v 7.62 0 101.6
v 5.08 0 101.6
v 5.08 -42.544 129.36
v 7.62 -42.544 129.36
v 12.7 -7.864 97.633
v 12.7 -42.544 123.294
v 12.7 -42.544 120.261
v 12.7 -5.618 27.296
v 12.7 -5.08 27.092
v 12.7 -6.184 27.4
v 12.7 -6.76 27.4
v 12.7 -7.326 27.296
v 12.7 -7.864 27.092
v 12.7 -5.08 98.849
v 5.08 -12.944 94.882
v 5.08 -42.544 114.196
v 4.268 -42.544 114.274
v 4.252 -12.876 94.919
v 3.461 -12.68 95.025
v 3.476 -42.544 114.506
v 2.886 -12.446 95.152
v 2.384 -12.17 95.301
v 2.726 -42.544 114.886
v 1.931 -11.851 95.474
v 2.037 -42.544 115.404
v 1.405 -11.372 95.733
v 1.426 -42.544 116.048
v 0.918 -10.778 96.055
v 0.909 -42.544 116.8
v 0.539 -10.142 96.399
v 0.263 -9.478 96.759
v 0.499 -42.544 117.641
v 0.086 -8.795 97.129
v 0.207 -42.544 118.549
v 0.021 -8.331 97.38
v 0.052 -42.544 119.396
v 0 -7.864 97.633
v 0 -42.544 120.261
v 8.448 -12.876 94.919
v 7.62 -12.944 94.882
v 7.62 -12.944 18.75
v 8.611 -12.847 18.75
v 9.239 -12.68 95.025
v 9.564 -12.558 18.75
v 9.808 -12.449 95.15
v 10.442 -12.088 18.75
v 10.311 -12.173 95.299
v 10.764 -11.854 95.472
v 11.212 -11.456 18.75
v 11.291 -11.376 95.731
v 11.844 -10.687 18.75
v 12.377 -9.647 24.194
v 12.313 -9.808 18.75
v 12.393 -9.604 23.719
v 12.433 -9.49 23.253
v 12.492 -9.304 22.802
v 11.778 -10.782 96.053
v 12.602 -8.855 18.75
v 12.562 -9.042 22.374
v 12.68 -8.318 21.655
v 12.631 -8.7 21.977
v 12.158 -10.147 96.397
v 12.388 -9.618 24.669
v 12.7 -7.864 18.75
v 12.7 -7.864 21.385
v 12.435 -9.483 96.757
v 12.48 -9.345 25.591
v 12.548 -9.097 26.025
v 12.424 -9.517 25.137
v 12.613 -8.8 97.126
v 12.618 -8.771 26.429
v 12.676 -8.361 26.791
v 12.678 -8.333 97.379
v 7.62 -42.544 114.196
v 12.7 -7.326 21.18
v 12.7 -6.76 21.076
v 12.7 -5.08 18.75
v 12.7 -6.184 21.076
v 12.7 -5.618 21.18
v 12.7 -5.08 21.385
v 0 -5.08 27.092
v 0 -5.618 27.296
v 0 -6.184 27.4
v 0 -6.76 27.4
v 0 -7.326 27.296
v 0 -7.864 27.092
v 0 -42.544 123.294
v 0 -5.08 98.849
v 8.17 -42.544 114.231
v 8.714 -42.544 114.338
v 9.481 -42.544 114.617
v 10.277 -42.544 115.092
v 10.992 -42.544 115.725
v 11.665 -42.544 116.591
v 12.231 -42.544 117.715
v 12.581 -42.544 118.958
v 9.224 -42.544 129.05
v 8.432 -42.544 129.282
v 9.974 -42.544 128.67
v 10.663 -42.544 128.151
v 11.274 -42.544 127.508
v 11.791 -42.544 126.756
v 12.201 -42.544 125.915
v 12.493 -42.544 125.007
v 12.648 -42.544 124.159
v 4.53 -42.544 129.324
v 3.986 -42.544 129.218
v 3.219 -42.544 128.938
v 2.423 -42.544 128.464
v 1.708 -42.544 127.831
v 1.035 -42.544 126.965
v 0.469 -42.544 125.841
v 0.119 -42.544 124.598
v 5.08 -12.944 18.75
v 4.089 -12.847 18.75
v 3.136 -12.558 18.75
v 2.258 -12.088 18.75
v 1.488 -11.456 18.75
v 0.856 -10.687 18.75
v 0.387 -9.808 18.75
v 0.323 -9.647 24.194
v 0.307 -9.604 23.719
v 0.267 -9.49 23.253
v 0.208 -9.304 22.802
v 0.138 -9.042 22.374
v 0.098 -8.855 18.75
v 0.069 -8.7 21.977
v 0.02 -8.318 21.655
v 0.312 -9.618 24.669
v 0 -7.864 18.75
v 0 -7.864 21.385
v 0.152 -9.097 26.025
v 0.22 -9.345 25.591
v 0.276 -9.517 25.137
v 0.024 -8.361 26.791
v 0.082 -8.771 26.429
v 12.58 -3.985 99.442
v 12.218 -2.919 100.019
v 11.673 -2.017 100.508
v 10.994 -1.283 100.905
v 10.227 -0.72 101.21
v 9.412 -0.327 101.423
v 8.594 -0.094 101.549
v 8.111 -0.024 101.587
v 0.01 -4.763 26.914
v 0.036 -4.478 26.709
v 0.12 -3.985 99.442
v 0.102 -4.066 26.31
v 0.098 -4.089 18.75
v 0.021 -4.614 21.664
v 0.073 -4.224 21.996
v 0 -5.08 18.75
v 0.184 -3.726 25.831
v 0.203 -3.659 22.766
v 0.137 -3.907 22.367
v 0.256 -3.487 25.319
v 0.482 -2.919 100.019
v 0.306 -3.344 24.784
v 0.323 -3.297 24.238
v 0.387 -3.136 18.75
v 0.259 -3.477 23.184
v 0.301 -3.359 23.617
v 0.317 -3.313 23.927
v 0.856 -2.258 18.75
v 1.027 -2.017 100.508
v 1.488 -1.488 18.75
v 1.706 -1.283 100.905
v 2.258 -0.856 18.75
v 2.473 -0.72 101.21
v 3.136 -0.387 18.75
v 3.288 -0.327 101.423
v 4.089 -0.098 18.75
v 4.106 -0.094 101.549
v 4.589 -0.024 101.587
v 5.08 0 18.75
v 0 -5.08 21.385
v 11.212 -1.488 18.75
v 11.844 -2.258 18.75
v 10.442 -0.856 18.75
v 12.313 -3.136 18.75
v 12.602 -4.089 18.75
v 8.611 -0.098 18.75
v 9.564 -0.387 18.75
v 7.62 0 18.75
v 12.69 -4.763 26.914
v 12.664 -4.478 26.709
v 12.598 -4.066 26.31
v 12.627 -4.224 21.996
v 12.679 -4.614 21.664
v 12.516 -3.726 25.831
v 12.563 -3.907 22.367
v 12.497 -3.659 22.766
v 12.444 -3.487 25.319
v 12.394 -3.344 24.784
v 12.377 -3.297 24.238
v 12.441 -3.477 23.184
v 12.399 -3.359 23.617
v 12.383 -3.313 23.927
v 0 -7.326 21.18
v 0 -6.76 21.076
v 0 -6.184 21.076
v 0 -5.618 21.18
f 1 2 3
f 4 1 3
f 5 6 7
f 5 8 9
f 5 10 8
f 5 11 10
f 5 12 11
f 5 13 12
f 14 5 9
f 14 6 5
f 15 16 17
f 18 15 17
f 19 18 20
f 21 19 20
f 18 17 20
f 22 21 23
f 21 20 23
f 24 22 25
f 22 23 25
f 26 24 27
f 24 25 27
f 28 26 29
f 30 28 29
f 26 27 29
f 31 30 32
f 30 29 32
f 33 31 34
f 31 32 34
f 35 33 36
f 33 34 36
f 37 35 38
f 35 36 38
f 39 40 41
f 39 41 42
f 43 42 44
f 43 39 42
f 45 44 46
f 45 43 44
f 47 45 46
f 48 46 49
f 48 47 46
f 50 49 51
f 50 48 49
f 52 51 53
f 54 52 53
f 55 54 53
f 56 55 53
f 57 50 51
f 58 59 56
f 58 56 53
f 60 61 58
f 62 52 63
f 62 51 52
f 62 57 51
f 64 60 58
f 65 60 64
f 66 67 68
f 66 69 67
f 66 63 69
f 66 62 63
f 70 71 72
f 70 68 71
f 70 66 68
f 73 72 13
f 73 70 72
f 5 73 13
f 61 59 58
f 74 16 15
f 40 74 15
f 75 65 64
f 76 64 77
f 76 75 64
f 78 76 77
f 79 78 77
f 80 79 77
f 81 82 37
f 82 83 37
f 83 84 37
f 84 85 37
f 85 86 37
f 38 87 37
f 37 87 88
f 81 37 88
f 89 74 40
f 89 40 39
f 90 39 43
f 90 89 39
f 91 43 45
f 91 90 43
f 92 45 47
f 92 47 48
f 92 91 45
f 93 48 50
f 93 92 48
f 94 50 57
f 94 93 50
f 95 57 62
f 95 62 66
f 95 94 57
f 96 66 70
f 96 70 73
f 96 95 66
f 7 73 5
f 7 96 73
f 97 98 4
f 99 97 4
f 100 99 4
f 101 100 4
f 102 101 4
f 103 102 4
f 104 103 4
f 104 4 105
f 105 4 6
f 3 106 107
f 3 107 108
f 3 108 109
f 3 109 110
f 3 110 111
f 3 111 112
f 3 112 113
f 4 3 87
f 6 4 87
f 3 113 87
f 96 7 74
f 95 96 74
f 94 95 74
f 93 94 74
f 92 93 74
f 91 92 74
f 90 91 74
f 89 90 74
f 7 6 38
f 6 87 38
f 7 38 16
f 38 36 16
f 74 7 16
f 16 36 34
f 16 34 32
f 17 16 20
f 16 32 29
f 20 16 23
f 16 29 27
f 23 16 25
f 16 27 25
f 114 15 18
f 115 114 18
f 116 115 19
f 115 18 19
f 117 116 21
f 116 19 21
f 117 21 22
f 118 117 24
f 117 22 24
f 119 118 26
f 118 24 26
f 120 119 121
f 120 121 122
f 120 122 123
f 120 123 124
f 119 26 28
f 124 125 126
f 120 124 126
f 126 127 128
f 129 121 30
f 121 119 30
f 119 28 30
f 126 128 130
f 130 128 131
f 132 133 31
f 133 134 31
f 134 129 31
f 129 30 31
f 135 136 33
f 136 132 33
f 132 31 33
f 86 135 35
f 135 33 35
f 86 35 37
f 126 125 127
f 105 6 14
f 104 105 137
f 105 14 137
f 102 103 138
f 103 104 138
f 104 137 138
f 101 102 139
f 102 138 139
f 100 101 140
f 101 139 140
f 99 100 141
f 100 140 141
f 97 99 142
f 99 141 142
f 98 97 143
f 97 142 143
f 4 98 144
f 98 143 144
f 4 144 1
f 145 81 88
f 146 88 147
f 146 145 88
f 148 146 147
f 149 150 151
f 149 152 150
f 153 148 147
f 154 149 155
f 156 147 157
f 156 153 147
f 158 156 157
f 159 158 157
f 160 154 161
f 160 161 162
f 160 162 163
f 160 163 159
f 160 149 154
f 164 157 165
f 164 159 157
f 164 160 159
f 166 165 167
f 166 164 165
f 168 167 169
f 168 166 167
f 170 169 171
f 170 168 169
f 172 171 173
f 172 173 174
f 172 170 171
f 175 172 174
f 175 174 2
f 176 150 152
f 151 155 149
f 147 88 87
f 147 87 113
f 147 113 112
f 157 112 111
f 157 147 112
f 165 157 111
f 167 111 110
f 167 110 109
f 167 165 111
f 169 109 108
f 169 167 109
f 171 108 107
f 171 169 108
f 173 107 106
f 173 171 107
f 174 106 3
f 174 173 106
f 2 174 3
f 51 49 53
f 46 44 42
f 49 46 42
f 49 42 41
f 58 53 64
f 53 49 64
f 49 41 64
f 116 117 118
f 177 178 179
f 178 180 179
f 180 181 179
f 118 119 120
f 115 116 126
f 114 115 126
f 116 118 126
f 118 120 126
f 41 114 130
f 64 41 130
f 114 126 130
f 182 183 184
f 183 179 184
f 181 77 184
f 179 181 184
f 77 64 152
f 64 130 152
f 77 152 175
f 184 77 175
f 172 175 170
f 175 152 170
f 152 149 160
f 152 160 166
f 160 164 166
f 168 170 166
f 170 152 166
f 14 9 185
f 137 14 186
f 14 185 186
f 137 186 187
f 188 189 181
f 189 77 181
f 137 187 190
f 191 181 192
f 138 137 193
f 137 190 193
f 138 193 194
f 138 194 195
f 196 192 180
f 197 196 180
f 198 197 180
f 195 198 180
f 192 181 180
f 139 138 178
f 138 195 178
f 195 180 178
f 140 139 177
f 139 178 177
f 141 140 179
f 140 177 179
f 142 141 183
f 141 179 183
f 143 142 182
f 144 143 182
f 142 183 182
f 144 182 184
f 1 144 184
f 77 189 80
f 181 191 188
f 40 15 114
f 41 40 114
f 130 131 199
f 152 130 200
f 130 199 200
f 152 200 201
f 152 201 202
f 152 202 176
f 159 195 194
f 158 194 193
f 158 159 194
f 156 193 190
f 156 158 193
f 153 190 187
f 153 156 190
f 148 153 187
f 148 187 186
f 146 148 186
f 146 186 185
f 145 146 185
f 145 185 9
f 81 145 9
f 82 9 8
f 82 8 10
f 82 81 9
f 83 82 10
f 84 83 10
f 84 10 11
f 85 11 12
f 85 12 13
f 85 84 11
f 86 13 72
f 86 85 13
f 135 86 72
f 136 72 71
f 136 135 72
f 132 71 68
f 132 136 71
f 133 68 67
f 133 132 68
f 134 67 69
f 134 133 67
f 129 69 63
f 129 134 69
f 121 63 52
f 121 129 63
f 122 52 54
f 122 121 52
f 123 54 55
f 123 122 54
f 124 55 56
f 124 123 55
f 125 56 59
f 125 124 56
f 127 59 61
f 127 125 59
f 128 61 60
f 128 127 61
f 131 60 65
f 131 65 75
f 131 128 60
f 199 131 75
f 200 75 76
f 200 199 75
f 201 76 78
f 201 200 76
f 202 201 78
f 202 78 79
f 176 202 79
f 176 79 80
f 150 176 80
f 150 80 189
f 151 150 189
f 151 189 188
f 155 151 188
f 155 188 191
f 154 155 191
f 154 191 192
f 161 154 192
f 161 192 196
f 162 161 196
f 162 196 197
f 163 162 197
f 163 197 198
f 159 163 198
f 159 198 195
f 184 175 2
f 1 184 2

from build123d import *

# Parameters (mm, degrees)
F0_R         = 3.175
F1_DEPTH     = 12.7
F3_DEPTH     = 12.701
F4_T1_DEPTH  = 108.2499657273
F4_T3_DEPTH  = 76.2
F4_T8_DEPTH  = 101.5317029417
F4_T13_DEPTH = 101.5317029417
F4_T18_DEPTH = 60.7438000865
F4_T23_DEPTH = 60.7438000865
F4_T29_DEPTH = 101.5317029417
F4_T33_DEPTH = 60.7438000865
F4_T40_DEPTH = 101.5317029417
F4_T44_DEPTH = 60.7438000865


# Not quite as in the source:
# - a fillet or chamfer that OpenCascade refuses, or shapes differently, is made with other operations: its cross-section is extruded or revolved along the edge and cut away or added


with BuildPart() as f1:
    # F0 (on Right) → F1 (new body)
    with BuildSketch(Plane.YZ):
        Polygon((-12.9443686455, 18.7500342727), (0, 18.7500342727), (0, 101.6), (-42.5443466617, 129.3600174195), (-49.4843510166, 118.7239307541), (-12.9443686455, 94.8817372144), align=None)
        with Locations((-6.4721843228, 24.2384169251)):
            Circle(F0_R, mode=Mode.SUBTRACT)
    extrude(amount=F1_DEPTH)

    # F2 (on face) → F3 (cut, through all)
    with BuildSketch(Plane(origin=(0, 0, 0), x_dir=(0, -1, 0), z_dir=(-1, 0, 0))):
        Polygon((49.4843510166, 118.7239307541), (42.5443466617, 129.3600174195), (42.5443466617, 114.1956054441), align=None)
    extrude(amount=-F3_DEPTH, mode=Mode.SUBTRACT)

    # F4: fillet of radius 5.08 on 8 edges, made by hand

    # F4_s2 → F4_t1 (cut)
    with BuildSketch(Plane.XY.offset(6.0500342727)):
        with BuildLine():
            ThreePointArc((0, -5.08), (1.4878975516, -1.4878975516), (5.08, 0))
            Line((5.08, 0), (0, 0))
            Line((0, 0), (0, -5.08))
        make_face()
        with BuildLine():
            ThreePointArc((12.7, -5.08), (11.2121024484, -1.4878975516), (7.62, 0))
            Line((7.62, 0), (12.7, 0))
            Line((12.7, 0), (12.7, -5.08))
        make_face()
    extrude(amount=F4_T1_DEPTH, mode=Mode.SUBTRACT)

    # F4_s4 → F4_t3 (cut)
    with BuildSketch(Plane(origin=(0, -35.8612284696, 23.3993093117), x_dir=(1, 0, 0), z_dir=(0, -0.837487139, 0.5464570358))):
        with BuildLine():
            ThreePointArc((12.7, 80.0086933233), (11.2121024484, 83.6007957718), (7.62, 85.0886933233))
            Line((7.62, 85.0886933233), (12.7, 85.0886933233))
            Line((12.7, 85.0886933233), (12.7, 80.0086933233))
        make_face()
        with BuildLine():
            ThreePointArc((0, 80.0086933233), (1.4878975516, 83.6007957718), (5.08, 85.0886933233))
            Line((5.08, 85.0886933233), (0, 85.0886933233))
            Line((0, 85.0886933233), (0, 80.0086933233))
        make_face()
    extrude(amount=F4_T3_DEPTH, mode=Mode.SUBTRACT)


with BuildPart() as f4_tool6:
    # F4_s7 → F4_t8 (new body)
    with BuildSketch(Plane.XY.offset(107.5817372144)):
        with BuildLine():
            ThreePointArc((5.08, -12.9443686455), (1.4878975516, -11.456471094), (0, -7.8643686455))
            Line((0, -7.8643686455), (0, -12.9443686455))
            Line((0, -12.9443686455), (5.08, -12.9443686455))
        make_face()
    extrude(amount=-F4_T8_DEPTH)

    split(bisect_by=Plane(origin=(0, 39.5573107801, 60.624599668), x_dir=(1, 0, 0), z_dir=(0, -0.5464570358, -0.837487139)), keep=Keep.TOP)


with BuildPart() as f1_1:
    add(f1.part)

    # F4_t5: cut F4_tool6
    add(f4_tool6.part, mode=Mode.SUBTRACT)


with BuildPart() as f4_tool11:
    # F4_s12 → F4_t13 (new body)
    with BuildSketch(Plane.XY.offset(107.5817372144)):
        with BuildLine():
            ThreePointArc((7.62, -12.9443686455), (11.2121024484, -11.456471094), (12.7, -7.8643686455))
            Line((12.7, -7.8643686455), (12.7, -12.9443686455))
            Line((12.7, -12.9443686455), (7.62, -12.9443686455))
        make_face()
    extrude(amount=-F4_T13_DEPTH)

    split(bisect_by=Plane(origin=(0, 39.5573107801, 60.624599668), x_dir=(1, 0, 0), z_dir=(0, -0.5464570358, -0.837487139)), keep=Keep.TOP)


with BuildPart() as f1_2:
    add(f1_1.part)

    # F4_t10: cut F4_tool11
    add(f4_tool11.part, mode=Mode.SUBTRACT)


with BuildPart() as f4_tool16:
    # F4_s17 → F4_t18 (new body)
    with BuildSketch(Plane(origin=(0, -92.7377441072, 60.511010131), x_dir=(1, 0, 0), z_dir=(0, 0.837487139, -0.5464570358))):
        with BuildLine():
            ThreePointArc((7.62, -72.3886933233), (11.2121024484, -73.8765908749), (12.7, -77.4686933233))
            Line((12.7, -77.4686933233), (12.7, -72.3886933233))
            Line((12.7, -72.3886933233), (7.62, -72.3886933233))
        make_face()
    extrude(amount=F4_T18_DEPTH)

    split(bisect_by=Plane.XZ.offset(12.9443686455), keep=Keep.TOP)


with BuildPart() as f1_3:
    add(f1_2.part)

    # F4_t15: cut F4_tool16
    add(f4_tool16.part, mode=Mode.SUBTRACT)


with BuildPart() as f4_tool21:
    # F4_s22 → F4_t23 (new body)
    with BuildSketch(Plane(origin=(0, -92.7377441072, 60.511010131), x_dir=(1, 0, 0), z_dir=(0, 0.837487139, -0.5464570358))):
        with BuildLine():
            ThreePointArc((5.08, -72.3886933233), (1.4878975516, -73.8765908749), (0, -77.4686933233))
            Line((0, -77.4686933233), (0, -72.3886933233))
            Line((0, -72.3886933233), (5.08, -72.3886933233))
        make_face()
    extrude(amount=F4_T23_DEPTH)

    split(bisect_by=Plane.XZ.offset(12.9443686455), keep=Keep.TOP)


with BuildPart() as f1_4:
    add(f1_3.part)

    # F4_t20: cut F4_tool21
    add(f4_tool21.part, mode=Mode.SUBTRACT)


with BuildPart() as f4_tool27:
    # F4_s28 → F4_t29 (new body)
    with BuildSketch(Plane.XY.offset(107.5817372144)):
        with BuildLine():
            ThreePointArc((5.08, -12.9443686455), (1.4878975516, -11.456471094), (0, -7.8643686455))
            Line((0, -7.8643686455), (0, -12.9443686455))
            Line((0, -12.9443686455), (5.08, -12.9443686455))
        make_face()
    extrude(amount=-F4_T29_DEPTH)

    split(bisect_by=Plane(origin=(0, 39.5573107801, 60.624599668), x_dir=(1, 0, 0), z_dir=(0, 0.5464570358, 0.837487139)), keep=Keep.TOP)


with BuildPart() as f4_tool31:
    # F4_s32 → F4_t33 (new body)
    with BuildSketch(Plane(origin=(0, -92.7377441072, 60.511010131), x_dir=(1, 0, 0), z_dir=(0, 0.837487139, -0.5464570358))):
        with BuildLine():
            ThreePointArc((5.08, -72.3886933233), (1.4878975516, -73.8765908749), (0, -77.4686933233))
            Line((0, -77.4686933233), (0, -72.3886933233))
            Line((0, -72.3886933233), (5.08, -72.3886933233))
        make_face()
    extrude(amount=F4_T33_DEPTH)

    split(bisect_by=Plane.XZ.offset(12.9443686455), keep=Keep.BOTTOM)


with BuildPart() as f4_tool27_1:
    add(f4_tool27.part)

    # F4_t35: intersect F4_tool31
    add(f4_tool31.part, mode=Mode.INTERSECT)


with BuildPart() as f1_5:
    add(f1_4.part)

    # F4_t25: cut F4_tool27
    add(f4_tool27_1.part, mode=Mode.SUBTRACT)


with BuildPart() as f4_tool38:
    # F4_s39 → F4_t40 (new body)
    with BuildSketch(Plane.XY.offset(107.5817372144)):
        with BuildLine():
            ThreePointArc((7.62, -12.9443686455), (11.2121024484, -11.456471094), (12.7, -7.8643686455))
            Line((12.7, -7.8643686455), (12.7, -12.9443686455))
            Line((12.7, -12.9443686455), (7.62, -12.9443686455))
        make_face()
    extrude(amount=-F4_T40_DEPTH)

    split(bisect_by=Plane(origin=(0, 39.5573107801, 60.624599668), x_dir=(1, 0, 0), z_dir=(0, 0.5464570358, 0.837487139)), keep=Keep.TOP)


with BuildPart() as f4_tool42:
    # F4_s43 → F4_t44 (new body)
    with BuildSketch(Plane(origin=(0, -92.7377441072, 60.511010131), x_dir=(1, 0, 0), z_dir=(0, 0.837487139, -0.5464570358))):
        with BuildLine():
            ThreePointArc((7.62, -72.3886933233), (11.2121024484, -73.8765908749), (12.7, -77.4686933233))
            Line((12.7, -77.4686933233), (12.7, -72.3886933233))
            Line((12.7, -72.3886933233), (7.62, -72.3886933233))
        make_face()
    extrude(amount=F4_T44_DEPTH)

    split(bisect_by=Plane.XZ.offset(12.9443686455), keep=Keep.BOTTOM)


with BuildPart() as f4_tool38_1:
    add(f4_tool38.part)

    # F4_t46: intersect F4_tool42
    add(f4_tool42.part, mode=Mode.INTERSECT)


with BuildPart() as f1_6:
    add(f1_5.part)

    # F4_t36: cut F4_tool38
    add(f4_tool38_1.part, mode=Mode.SUBTRACT)


solid = f1_6.part
